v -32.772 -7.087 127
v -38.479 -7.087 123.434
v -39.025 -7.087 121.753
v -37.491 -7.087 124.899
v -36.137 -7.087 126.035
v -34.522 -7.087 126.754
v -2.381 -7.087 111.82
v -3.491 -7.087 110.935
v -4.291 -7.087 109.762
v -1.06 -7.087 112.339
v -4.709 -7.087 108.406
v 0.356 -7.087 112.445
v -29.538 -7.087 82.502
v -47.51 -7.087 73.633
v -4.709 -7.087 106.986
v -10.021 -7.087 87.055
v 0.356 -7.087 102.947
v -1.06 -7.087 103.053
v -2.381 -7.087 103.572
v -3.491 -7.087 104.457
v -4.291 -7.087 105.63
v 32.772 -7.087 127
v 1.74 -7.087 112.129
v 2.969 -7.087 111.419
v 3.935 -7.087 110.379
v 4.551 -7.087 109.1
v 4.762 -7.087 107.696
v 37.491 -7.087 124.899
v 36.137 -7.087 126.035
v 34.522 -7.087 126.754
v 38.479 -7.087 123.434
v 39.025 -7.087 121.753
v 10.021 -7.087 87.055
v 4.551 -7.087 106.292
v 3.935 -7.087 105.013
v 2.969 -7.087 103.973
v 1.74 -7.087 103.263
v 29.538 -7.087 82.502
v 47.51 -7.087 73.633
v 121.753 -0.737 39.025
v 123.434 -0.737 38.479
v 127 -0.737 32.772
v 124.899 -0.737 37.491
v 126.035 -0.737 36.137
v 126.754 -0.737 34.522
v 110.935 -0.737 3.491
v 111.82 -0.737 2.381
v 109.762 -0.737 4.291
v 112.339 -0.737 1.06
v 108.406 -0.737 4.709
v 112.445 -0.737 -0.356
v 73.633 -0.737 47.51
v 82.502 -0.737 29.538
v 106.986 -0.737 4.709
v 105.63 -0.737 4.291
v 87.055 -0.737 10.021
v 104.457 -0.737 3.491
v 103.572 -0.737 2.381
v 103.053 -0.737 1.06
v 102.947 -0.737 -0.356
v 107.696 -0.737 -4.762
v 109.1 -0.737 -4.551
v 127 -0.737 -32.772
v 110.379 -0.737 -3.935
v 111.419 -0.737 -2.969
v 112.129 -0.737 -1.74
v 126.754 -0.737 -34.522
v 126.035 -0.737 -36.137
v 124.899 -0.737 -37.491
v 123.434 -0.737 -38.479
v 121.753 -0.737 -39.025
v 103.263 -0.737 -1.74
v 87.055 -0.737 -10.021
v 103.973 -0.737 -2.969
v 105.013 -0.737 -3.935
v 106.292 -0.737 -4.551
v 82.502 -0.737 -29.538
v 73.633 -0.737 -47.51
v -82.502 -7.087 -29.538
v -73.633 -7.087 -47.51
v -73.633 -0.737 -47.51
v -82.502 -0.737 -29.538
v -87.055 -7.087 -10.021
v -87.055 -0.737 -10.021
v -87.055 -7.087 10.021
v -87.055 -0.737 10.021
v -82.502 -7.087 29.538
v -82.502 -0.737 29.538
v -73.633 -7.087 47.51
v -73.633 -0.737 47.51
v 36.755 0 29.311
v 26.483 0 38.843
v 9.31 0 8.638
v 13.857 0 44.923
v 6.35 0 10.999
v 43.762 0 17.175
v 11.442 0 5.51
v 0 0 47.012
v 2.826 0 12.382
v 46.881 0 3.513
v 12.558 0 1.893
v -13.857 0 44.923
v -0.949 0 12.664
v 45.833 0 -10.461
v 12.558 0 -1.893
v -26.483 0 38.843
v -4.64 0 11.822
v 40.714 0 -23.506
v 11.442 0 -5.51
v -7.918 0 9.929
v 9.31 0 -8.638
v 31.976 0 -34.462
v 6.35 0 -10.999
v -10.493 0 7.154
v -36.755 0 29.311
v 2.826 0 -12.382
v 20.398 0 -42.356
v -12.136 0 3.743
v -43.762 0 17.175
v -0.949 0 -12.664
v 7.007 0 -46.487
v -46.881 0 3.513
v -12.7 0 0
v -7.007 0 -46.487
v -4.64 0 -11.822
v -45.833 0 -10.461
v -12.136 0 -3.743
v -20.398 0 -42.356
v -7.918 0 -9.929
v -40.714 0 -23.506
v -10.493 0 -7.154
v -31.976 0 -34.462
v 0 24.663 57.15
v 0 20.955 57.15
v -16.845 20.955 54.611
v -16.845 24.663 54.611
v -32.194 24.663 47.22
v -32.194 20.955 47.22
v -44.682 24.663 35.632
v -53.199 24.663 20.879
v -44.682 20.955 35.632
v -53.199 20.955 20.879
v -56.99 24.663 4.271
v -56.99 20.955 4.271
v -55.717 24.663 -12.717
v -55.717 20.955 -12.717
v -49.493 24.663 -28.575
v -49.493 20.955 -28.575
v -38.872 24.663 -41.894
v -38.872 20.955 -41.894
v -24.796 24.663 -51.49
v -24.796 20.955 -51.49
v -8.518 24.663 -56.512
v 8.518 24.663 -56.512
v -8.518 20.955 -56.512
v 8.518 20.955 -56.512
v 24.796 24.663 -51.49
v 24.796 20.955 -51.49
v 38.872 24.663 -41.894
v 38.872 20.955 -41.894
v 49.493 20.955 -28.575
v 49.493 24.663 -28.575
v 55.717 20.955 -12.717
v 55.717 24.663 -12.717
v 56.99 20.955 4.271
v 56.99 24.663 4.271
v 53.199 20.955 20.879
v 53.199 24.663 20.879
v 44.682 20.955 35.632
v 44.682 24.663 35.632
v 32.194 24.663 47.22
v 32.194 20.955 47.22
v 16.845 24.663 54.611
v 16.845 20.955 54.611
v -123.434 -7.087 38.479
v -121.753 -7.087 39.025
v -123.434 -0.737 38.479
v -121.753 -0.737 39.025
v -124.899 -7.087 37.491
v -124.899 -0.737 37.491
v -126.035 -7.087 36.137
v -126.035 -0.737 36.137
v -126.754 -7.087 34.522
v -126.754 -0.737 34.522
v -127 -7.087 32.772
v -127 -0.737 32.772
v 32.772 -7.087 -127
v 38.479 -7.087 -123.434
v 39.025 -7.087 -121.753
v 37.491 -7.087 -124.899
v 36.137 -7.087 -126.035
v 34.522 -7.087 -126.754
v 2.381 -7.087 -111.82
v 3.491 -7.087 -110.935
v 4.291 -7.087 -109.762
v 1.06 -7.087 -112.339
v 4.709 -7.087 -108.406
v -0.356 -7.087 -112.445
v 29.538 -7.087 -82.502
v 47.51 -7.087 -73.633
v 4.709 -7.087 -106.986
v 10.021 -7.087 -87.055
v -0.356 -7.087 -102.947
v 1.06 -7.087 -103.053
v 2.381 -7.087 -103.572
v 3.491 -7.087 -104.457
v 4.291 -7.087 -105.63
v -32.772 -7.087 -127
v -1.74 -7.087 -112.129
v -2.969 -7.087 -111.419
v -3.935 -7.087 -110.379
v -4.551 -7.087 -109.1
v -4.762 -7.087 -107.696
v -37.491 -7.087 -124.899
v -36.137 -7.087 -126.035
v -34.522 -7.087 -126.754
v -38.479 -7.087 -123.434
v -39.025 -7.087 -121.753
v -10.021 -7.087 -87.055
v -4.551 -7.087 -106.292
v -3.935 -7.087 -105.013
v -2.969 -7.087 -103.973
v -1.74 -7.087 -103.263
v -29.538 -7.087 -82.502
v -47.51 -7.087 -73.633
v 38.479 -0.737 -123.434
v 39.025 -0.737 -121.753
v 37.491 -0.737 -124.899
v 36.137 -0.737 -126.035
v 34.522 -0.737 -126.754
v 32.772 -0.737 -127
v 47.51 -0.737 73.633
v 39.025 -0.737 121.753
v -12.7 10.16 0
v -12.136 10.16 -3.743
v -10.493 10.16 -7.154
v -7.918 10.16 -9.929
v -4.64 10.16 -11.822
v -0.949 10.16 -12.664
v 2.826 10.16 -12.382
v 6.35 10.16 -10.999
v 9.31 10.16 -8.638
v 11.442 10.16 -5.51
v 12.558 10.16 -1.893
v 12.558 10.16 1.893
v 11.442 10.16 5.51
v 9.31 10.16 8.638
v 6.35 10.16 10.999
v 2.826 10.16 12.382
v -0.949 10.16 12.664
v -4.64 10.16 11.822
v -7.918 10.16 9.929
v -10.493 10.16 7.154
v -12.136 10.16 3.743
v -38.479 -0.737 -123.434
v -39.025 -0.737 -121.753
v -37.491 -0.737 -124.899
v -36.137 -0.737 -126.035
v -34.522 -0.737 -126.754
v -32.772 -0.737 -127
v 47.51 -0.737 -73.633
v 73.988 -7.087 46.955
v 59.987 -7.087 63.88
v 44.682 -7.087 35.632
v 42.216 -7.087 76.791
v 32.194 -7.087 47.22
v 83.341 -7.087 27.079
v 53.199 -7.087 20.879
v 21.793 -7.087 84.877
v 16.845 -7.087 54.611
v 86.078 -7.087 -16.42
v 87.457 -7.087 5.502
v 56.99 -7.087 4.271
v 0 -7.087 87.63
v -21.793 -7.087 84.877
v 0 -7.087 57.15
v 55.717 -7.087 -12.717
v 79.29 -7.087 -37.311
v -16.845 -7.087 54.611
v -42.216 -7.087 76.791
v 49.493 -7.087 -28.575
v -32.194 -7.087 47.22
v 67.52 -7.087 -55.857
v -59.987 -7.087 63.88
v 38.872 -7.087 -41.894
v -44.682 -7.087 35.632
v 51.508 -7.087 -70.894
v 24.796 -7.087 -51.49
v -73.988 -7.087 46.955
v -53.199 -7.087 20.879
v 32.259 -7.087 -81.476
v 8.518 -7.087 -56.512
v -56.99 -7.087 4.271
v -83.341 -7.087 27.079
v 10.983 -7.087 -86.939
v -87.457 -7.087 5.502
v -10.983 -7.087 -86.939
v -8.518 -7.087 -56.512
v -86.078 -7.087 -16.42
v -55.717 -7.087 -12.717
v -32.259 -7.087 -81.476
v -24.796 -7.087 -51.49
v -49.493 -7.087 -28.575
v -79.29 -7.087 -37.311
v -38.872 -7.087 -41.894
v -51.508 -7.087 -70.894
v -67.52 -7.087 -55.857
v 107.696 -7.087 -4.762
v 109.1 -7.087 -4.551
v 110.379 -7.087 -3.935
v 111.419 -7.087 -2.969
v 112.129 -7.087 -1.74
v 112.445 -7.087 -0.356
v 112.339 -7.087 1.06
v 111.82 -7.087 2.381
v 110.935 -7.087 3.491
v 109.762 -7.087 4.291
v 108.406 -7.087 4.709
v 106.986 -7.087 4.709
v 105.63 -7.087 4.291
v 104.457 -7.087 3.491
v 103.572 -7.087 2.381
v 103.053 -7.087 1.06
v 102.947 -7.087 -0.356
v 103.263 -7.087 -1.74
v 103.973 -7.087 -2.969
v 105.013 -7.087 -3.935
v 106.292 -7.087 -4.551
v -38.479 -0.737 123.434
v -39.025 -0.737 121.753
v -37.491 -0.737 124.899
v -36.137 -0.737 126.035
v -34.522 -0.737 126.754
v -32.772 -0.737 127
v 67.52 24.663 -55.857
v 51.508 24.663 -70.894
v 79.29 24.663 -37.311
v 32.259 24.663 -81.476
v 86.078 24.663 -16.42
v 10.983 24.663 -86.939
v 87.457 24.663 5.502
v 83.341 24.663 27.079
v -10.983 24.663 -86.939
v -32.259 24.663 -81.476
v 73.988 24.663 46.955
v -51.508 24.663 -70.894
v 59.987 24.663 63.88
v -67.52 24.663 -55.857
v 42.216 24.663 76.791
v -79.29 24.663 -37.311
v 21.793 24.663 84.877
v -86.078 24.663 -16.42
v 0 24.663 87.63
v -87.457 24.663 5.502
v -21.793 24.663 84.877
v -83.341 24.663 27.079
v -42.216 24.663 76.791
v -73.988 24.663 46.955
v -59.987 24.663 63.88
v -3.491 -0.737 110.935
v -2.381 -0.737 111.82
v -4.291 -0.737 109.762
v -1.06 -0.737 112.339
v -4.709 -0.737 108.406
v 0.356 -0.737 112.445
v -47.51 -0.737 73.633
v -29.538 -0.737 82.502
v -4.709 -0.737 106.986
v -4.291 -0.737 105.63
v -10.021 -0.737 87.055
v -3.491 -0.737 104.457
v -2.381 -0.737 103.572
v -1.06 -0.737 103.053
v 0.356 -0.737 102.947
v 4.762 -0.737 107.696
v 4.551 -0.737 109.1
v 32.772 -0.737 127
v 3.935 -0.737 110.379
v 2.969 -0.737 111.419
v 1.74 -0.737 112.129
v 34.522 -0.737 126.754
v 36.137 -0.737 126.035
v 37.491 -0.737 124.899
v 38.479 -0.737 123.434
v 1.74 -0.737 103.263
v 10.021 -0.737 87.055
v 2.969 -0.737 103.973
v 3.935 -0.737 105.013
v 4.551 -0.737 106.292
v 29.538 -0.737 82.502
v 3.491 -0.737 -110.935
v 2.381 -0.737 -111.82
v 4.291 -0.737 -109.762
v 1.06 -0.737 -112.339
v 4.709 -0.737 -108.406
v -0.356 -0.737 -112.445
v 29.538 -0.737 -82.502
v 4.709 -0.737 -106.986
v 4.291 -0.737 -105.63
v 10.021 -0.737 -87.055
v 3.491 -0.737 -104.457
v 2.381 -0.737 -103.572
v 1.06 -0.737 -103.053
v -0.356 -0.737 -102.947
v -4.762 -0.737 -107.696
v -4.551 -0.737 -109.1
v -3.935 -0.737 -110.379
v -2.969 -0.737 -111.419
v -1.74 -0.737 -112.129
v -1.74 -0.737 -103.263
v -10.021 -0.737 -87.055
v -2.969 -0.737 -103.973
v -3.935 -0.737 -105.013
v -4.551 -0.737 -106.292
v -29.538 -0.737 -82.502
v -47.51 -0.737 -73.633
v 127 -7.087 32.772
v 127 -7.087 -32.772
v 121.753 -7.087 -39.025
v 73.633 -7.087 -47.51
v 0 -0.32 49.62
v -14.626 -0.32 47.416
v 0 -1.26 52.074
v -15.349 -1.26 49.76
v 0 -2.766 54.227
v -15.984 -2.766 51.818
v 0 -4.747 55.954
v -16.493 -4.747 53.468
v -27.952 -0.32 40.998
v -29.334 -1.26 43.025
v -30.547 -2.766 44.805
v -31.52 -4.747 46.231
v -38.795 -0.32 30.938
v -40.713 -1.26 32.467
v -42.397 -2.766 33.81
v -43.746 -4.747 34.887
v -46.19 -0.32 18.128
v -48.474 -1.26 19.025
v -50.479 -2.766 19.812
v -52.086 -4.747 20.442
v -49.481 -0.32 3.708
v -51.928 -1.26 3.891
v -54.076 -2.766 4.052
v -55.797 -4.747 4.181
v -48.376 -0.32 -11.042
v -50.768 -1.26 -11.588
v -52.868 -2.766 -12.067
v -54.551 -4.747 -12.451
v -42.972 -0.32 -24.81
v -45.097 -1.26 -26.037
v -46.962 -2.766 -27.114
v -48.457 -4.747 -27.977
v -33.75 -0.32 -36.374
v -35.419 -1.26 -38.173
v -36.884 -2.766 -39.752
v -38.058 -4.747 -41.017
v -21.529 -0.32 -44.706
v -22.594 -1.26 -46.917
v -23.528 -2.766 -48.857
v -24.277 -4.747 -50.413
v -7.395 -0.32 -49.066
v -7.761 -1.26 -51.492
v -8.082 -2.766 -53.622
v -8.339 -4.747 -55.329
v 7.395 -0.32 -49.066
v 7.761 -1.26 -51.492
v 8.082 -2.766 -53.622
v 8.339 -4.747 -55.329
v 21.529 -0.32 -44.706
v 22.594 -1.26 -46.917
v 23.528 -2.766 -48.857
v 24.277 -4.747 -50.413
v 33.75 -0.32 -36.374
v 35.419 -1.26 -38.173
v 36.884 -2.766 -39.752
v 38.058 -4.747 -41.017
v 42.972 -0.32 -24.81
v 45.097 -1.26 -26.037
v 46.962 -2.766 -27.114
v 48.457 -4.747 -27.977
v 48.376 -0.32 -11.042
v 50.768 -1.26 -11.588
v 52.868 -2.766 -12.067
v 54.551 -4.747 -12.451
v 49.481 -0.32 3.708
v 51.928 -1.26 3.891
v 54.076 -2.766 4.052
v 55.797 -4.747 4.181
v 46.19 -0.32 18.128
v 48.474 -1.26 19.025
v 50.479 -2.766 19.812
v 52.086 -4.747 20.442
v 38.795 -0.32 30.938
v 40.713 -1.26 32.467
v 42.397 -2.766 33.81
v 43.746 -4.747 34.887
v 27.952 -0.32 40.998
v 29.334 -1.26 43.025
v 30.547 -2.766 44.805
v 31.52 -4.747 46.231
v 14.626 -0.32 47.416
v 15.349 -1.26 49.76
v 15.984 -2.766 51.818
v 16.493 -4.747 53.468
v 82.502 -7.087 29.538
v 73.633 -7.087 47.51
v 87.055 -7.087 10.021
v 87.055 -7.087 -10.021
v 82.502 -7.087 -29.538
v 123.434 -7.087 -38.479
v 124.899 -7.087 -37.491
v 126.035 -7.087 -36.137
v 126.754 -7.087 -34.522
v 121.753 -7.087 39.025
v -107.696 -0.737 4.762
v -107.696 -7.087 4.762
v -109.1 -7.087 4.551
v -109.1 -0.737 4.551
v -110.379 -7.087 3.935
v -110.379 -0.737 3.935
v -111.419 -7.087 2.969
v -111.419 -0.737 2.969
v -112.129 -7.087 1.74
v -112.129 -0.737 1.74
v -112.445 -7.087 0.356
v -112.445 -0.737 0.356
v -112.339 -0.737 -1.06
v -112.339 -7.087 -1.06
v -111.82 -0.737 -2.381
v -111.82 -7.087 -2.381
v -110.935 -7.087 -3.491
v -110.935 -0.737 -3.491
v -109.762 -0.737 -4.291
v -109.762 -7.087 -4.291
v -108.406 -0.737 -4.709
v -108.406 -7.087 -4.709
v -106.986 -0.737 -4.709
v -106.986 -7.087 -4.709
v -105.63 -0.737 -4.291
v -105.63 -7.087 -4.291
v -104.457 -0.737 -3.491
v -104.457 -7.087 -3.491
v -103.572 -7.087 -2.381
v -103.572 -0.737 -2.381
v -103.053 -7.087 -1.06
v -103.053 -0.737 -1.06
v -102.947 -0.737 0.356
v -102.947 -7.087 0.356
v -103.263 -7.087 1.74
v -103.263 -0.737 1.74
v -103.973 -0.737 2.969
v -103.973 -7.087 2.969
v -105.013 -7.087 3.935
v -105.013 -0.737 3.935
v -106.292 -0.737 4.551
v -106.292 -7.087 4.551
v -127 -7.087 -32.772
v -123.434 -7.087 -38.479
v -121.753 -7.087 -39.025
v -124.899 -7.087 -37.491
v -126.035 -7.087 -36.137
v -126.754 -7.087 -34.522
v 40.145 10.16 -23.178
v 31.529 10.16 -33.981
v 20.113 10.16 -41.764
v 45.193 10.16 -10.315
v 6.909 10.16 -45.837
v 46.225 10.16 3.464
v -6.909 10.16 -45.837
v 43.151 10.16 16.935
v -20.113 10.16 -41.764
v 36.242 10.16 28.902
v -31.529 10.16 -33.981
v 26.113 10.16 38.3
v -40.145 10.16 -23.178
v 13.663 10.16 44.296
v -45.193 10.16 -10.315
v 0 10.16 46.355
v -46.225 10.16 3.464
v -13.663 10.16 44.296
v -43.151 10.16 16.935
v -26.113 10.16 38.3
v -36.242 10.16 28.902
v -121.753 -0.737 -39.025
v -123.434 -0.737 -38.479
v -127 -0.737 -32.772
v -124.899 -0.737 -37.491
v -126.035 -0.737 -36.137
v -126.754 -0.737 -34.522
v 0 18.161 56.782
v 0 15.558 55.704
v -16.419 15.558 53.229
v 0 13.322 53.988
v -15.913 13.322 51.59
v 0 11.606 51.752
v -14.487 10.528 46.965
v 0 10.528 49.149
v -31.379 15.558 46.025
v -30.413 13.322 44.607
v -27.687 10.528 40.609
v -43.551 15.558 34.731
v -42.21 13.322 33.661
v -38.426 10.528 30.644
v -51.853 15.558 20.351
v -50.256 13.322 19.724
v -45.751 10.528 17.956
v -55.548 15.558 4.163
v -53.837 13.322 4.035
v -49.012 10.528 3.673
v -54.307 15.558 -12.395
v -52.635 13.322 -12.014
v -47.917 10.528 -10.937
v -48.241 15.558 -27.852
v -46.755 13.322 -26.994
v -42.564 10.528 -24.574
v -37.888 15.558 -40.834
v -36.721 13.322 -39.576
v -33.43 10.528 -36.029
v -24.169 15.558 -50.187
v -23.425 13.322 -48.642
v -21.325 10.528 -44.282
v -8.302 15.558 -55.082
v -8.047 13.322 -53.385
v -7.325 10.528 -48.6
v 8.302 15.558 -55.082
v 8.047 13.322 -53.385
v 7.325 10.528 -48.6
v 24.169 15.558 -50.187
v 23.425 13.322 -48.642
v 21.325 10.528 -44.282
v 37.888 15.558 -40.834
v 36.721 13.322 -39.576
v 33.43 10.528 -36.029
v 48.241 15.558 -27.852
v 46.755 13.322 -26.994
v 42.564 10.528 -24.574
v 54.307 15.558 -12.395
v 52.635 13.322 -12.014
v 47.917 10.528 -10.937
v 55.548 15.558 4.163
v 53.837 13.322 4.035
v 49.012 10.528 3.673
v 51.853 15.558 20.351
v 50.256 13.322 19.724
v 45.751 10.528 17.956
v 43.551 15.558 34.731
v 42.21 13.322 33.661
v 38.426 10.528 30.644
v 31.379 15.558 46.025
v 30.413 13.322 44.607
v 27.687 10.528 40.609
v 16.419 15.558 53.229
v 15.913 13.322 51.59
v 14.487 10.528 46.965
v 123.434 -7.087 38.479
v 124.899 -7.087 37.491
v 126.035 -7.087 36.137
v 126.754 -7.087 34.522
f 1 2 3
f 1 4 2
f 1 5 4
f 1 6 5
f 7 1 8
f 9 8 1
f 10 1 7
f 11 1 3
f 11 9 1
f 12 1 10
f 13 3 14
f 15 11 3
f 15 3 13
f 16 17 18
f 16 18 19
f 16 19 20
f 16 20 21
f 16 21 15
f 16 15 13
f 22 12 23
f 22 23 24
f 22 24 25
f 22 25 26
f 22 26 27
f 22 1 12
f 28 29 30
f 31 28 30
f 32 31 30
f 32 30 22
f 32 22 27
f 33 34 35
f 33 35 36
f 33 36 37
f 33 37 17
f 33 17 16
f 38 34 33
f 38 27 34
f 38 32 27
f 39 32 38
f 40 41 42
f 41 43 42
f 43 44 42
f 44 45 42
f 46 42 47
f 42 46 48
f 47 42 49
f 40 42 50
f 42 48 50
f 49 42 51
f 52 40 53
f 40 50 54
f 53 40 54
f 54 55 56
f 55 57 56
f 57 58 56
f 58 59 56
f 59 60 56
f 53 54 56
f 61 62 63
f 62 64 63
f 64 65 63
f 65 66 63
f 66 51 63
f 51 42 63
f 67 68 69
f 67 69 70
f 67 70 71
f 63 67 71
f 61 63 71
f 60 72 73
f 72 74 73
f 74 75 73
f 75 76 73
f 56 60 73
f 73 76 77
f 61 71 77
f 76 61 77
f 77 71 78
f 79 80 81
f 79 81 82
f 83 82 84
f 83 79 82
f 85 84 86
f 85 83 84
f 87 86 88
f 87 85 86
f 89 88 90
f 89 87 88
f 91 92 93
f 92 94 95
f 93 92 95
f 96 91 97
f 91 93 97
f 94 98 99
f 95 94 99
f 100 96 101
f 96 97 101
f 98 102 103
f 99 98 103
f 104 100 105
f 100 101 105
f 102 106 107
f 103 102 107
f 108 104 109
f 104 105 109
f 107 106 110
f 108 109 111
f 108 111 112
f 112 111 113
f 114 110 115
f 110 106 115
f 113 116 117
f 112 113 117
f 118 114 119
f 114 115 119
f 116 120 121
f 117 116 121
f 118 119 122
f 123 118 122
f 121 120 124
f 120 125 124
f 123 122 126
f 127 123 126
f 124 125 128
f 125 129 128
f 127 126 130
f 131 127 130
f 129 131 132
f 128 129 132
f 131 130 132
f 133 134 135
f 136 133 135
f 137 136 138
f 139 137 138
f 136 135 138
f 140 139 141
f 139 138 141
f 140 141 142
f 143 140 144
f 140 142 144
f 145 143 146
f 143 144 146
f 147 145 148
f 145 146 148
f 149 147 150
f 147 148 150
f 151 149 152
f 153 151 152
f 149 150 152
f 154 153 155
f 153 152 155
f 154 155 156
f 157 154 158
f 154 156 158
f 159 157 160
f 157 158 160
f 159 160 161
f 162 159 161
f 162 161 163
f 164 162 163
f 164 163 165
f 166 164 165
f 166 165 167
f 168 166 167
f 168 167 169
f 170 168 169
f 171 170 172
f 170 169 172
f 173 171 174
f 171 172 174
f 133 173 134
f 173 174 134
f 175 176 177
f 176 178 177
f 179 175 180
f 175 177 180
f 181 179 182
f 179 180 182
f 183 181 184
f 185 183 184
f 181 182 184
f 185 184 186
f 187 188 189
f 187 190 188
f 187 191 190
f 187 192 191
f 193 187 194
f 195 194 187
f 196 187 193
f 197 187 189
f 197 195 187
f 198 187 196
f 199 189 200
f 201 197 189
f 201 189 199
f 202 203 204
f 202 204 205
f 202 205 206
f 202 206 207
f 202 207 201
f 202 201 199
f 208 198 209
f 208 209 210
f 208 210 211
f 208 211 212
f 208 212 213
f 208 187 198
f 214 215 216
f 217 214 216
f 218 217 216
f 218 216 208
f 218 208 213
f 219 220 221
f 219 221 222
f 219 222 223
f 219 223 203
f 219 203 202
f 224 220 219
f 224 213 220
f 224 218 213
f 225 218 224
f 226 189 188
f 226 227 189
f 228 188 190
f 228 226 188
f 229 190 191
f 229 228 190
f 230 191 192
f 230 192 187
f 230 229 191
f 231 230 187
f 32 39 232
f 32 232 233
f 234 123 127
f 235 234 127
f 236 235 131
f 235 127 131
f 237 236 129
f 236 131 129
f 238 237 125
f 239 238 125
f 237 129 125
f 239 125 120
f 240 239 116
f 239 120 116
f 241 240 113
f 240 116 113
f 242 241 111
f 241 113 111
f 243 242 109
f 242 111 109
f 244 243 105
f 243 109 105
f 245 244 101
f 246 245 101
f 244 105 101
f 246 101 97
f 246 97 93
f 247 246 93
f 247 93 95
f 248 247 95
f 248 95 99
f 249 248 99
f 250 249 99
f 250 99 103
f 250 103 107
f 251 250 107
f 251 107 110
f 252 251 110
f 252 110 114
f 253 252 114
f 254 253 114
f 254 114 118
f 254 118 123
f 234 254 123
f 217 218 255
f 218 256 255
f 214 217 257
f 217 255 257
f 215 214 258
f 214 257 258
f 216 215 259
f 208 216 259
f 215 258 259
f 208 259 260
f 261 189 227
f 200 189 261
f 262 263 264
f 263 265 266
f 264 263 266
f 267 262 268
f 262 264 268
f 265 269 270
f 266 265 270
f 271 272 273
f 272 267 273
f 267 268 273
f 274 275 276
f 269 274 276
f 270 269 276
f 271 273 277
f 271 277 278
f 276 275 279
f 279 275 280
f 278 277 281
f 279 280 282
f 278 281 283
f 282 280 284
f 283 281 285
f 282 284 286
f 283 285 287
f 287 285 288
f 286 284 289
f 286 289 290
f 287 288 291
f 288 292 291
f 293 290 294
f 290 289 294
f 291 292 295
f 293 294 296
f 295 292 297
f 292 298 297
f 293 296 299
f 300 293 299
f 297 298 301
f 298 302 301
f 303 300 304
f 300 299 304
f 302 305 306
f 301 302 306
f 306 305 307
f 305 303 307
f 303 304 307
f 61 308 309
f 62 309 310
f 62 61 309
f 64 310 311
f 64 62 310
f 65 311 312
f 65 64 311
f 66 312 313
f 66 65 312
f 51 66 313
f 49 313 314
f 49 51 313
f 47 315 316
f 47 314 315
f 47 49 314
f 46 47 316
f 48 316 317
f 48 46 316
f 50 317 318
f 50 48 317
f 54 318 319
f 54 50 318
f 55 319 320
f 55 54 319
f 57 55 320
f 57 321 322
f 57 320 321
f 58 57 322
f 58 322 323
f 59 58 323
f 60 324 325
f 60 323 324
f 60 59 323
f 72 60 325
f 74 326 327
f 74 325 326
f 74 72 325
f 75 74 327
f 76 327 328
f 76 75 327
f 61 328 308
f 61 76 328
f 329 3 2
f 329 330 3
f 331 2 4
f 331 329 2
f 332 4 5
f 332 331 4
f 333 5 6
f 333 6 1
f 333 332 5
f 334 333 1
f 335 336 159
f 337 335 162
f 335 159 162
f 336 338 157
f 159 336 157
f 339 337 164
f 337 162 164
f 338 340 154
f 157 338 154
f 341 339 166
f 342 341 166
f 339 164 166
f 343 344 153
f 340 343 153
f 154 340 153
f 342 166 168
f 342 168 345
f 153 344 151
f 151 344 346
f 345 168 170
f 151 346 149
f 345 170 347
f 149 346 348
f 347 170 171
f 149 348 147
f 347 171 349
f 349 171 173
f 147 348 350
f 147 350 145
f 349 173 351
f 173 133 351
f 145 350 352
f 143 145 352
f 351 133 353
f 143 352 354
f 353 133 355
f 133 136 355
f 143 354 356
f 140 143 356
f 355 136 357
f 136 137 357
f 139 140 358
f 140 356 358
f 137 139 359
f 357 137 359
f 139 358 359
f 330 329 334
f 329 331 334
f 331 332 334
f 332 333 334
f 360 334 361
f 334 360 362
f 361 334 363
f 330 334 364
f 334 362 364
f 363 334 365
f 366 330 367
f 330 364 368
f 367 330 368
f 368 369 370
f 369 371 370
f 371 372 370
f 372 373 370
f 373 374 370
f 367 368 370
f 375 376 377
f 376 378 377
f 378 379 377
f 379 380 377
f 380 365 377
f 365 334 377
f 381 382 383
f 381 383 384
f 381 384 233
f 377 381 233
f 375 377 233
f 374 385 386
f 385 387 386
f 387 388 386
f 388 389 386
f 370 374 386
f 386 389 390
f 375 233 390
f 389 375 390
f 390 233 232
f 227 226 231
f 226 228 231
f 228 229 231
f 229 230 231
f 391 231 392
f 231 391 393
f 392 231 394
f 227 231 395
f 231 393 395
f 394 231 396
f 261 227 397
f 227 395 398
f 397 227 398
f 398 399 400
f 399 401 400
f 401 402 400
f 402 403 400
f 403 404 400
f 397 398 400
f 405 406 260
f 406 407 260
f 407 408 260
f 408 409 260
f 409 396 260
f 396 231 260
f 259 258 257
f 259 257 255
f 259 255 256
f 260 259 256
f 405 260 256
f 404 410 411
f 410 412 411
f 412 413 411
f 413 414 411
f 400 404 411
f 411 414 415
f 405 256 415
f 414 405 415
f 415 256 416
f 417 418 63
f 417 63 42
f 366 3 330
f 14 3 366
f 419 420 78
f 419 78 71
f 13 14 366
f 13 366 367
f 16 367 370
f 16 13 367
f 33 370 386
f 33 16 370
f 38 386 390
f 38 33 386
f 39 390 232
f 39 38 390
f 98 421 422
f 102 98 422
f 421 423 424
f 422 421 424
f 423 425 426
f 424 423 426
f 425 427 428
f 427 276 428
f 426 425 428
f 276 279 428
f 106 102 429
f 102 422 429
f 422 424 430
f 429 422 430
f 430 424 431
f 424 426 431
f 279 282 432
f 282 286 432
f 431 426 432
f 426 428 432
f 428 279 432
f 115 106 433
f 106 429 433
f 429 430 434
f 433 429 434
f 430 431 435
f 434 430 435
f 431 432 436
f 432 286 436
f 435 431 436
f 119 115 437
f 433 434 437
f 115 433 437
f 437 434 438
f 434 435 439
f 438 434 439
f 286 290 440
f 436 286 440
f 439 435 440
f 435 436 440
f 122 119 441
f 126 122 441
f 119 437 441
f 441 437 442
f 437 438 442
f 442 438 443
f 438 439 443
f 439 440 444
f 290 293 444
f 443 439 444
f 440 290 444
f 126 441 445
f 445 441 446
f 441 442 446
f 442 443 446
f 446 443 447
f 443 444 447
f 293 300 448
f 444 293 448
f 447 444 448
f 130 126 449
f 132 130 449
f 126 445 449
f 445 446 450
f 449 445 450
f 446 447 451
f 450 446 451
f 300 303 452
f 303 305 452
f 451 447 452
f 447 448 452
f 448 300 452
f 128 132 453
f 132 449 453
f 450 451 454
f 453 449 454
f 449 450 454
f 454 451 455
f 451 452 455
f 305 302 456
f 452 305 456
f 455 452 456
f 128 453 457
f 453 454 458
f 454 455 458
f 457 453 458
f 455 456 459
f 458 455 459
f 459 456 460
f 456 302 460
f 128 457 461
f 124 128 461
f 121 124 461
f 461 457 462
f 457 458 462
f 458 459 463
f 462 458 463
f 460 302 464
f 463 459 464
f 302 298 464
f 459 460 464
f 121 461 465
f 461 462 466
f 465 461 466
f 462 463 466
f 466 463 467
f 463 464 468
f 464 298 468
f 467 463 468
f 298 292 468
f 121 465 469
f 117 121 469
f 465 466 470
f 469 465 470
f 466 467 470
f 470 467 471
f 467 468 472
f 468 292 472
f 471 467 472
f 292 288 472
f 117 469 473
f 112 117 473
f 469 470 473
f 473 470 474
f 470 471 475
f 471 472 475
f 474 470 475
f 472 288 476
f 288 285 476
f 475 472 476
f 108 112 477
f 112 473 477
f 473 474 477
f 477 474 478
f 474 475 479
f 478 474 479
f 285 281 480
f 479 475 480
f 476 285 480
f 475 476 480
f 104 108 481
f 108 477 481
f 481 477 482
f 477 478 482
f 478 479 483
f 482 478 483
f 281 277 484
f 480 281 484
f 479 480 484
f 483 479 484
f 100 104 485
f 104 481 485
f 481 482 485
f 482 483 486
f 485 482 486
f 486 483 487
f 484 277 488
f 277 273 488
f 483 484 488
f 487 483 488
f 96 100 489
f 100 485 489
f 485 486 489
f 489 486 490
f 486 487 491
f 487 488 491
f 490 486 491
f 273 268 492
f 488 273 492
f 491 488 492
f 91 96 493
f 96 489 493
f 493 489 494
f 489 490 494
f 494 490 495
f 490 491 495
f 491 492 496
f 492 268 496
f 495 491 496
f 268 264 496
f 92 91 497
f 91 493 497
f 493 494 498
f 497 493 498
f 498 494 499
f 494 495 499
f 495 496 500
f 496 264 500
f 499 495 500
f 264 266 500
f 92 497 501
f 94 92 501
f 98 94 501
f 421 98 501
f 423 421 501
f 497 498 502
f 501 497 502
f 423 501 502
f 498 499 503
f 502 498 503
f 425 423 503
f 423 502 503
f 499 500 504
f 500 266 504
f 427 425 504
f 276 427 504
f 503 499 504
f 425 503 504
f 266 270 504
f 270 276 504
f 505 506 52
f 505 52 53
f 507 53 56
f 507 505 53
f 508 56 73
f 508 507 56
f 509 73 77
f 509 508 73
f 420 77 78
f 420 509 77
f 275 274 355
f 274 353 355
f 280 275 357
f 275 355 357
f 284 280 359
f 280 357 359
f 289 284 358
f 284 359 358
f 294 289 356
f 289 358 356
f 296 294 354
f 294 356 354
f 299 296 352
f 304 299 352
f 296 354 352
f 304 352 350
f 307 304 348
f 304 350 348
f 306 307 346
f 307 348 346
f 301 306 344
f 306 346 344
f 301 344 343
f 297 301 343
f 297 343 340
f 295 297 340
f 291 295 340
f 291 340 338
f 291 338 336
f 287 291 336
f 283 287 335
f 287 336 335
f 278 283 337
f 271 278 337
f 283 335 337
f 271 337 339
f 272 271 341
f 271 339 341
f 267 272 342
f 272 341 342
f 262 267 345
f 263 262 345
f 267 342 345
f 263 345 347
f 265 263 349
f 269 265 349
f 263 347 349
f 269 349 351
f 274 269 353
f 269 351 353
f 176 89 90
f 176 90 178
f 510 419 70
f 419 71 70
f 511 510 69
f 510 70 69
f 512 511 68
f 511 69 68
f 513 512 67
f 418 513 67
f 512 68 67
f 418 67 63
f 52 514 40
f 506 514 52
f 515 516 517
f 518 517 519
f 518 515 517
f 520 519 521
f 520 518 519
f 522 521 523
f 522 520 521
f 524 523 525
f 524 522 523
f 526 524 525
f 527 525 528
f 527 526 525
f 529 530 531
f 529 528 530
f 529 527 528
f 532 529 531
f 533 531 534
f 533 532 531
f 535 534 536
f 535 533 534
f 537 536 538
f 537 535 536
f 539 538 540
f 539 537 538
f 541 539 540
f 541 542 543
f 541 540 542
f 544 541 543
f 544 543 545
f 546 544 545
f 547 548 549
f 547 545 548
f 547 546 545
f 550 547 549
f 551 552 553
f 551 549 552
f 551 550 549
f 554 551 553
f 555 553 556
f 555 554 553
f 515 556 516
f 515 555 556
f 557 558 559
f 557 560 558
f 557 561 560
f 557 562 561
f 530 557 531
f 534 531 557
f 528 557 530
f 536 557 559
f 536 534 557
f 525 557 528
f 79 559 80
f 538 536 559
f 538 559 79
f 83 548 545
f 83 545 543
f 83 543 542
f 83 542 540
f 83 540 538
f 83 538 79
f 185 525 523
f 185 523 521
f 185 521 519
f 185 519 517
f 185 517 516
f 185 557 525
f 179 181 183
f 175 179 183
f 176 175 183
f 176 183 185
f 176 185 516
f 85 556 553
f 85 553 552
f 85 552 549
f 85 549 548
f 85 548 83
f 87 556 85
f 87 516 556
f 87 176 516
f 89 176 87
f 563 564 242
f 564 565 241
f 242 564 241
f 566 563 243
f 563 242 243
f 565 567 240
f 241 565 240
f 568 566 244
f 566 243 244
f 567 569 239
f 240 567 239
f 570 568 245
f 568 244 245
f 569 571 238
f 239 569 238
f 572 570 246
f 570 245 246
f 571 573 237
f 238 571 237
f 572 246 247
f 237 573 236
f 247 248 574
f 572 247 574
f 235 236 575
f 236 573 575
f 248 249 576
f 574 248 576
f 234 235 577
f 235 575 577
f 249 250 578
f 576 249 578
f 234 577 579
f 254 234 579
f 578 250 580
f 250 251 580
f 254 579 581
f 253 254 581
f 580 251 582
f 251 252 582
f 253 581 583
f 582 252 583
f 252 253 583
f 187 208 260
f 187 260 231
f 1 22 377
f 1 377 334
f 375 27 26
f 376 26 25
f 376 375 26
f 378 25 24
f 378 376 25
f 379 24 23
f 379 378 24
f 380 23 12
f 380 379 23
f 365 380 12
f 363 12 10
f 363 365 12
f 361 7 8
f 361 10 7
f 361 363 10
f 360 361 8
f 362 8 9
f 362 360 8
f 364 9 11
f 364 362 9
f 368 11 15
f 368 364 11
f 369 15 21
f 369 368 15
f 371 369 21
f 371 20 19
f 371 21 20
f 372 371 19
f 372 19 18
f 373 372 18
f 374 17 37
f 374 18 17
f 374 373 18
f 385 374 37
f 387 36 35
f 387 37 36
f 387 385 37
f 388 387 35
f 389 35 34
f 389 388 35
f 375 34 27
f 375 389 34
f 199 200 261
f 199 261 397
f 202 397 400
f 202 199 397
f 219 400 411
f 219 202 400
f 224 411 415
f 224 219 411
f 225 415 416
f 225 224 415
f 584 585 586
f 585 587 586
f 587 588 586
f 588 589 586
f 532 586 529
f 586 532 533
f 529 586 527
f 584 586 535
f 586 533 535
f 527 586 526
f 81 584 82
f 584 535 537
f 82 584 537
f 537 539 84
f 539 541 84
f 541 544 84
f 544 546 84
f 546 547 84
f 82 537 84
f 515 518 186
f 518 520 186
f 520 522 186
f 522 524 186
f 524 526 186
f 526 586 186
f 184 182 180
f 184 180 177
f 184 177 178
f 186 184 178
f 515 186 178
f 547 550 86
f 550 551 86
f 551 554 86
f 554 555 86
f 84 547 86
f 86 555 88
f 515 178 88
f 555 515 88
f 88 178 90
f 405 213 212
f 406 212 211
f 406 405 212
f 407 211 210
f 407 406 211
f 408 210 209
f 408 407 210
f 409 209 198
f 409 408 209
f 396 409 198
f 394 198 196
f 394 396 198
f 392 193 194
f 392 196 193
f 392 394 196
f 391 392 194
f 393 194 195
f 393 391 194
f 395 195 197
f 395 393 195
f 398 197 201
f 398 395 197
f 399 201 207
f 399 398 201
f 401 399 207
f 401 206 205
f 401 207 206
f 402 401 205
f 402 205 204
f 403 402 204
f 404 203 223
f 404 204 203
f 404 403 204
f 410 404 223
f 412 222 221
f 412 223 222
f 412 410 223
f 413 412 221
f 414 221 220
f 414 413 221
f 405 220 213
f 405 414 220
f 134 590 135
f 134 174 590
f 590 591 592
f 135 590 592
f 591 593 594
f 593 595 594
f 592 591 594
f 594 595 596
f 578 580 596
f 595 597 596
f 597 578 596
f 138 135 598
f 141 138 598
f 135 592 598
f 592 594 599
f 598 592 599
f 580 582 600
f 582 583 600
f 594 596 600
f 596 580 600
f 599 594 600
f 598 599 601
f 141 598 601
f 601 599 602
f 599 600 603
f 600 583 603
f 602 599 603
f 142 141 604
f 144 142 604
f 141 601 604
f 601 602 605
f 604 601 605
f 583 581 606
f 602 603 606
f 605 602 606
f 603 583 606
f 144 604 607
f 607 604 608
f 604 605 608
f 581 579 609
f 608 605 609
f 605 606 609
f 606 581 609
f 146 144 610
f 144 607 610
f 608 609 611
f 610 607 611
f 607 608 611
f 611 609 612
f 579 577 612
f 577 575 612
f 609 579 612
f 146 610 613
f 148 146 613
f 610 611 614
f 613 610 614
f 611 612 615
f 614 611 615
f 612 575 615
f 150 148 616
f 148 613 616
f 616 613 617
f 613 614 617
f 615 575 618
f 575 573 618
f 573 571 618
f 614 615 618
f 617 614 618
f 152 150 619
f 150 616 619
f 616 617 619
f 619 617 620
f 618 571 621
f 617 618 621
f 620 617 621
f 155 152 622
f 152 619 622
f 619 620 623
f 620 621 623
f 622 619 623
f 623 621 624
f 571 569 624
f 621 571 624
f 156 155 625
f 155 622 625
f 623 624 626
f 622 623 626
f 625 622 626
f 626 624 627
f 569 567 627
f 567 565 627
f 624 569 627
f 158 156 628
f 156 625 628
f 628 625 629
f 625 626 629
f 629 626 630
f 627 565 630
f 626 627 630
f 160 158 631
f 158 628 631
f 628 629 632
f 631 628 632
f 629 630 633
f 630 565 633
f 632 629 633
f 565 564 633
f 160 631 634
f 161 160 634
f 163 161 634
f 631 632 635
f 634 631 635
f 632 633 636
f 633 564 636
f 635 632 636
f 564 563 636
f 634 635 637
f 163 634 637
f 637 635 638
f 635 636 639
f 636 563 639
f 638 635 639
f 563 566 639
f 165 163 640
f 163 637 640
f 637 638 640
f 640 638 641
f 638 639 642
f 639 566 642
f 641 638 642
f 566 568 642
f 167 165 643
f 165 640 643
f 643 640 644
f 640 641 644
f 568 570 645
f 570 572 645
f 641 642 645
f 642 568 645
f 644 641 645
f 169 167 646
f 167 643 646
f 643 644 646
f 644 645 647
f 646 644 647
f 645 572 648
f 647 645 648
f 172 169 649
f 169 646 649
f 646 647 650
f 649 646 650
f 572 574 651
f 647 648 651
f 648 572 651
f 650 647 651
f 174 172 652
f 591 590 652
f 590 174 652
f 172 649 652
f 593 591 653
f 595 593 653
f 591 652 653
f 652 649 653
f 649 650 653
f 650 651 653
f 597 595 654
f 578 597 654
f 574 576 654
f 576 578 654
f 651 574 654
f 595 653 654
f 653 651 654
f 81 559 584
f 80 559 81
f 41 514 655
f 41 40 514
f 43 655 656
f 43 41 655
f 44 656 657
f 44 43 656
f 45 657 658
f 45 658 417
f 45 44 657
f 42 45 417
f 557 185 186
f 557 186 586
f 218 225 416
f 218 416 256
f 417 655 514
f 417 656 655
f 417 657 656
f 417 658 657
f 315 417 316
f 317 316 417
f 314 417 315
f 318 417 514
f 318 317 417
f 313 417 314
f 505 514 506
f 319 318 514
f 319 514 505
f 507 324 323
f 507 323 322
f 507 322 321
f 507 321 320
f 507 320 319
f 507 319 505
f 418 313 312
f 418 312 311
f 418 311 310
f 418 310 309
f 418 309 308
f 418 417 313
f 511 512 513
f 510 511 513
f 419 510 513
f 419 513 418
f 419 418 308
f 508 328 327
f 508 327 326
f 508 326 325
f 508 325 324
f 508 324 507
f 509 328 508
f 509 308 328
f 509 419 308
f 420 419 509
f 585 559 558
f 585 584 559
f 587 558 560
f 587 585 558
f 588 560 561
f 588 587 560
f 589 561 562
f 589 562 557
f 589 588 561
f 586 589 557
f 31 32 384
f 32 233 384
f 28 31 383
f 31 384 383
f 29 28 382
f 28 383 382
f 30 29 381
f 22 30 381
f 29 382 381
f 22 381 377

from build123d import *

# Parameters (mm, degrees)
F_1_1_DIAMETER_HOLE1_D = 25.4
BOSS_EXTRUDE1_DEPTH    = 6.35
FILLET2_R              = 6.35
CIRPATTERN4_COUNT      = 4
FILLET3_R              = 10.795


with BuildPart() as part:
    # Sketch1 → Revolve1 (revolve)
    with BuildSketch(Plane.XY, mode=Mode.PRIVATE) as revolve1_sk:
        Polygon((87.63, -7.0866), (87.63, 24.6634), (57.15, 24.6634), (57.15, 10.16), (0, 10.16), (0, 0), (57.15, 0), (57.15, -7.0866), align=None)
    revolve(revolve1_sk.sketch.rotate(Axis((0, 92.596818824, 0), (0, -1, 0)), 90), axis=Axis((0, 92.596818824, 0), (0, -1, 0)))

    # 1 (1) Diameter Hole1 (through all)
    with Locations(Plane(origin=(0, 10.16, 0), x_dir=(1, 0, 0), z_dir=(0, 1, 0))):
        with Locations((0, 0)):
            Hole(F_1_1_DIAMETER_HOLE1_D / 2)

    # Fillet3
    # the kernel refuses this fillet: 10.795 mm, written as the material it adds along each edge
    with BuildSketch(Plane(origin=(0, 0, 0), x_dir=(0, 0, 1), z_dir=(1, 0, 0))) as fillet3_piece_1:
        with BuildLine():
            CenterArc((47.011962989, 10.795), FILLET3_R, 270, 69.907948581)
            Line((47.011962989, 0), (47.011962989, -0.2159))
            Line((47.011962989, -0.2159), (57.15, -0.2159))
            Line((57.15, -0.2159), (57.3659, 0))
            ThreePointArc((57.3659, 0), (57.3659, 3.5433), (57.35276074, 7.012432))
            Line((57.35276074, 7.012432), (57.15, 7.0866))
        make_face()
    revolve(axis=Axis((0, 0, 0), (0, -1, 0)))
    with BuildSketch(Plane(origin=(0, 10.16, 0), x_dir=(0, 0, 1), z_dir=(1, 0, 0))) as fillet3_piece_2:
        with BuildLine():
            CenterArc((57.15 - FILLET3_R, -FILLET3_R), FILLET3_R, 0, 90)
            Line((57.15 - FILLET3_R, 0), (57.15 - FILLET3_R, FILLET3_R * 0.02))
            Line((57.15 - FILLET3_R, FILLET3_R * 0.02), (57.15 + FILLET3_R * 0.02, FILLET3_R * 0.02))
            Line((57.15 + FILLET3_R * 0.02, FILLET3_R * 0.02), (57.15 + FILLET3_R * 0.02, -FILLET3_R))
            Line((57.15 + FILLET3_R * 0.02, -FILLET3_R), (57.15, -FILLET3_R))
        make_face()
    revolve(axis=Axis((0, 10.16, 0), (0, -1, 0)))


with BuildPart() as body_2:
    # Sketch15 → Boss-Extrude1 (new body)
    with BuildSketch(Plane.XZ.offset(7.0866)):
        with BuildLine():
            Line((-127, -38.1), (-73.632954963, -47.510049921))
            ThreePointArc((-73.632954963, -47.510049921), (-87.63, 0), (-73.632954963, 47.510049921))
            Line((-73.632954963, 47.510049921), (-127, 38.1))
            Line((-127, 38.1), (-127, -38.1))
        make_face()
    extrude(amount=-BOSS_EXTRUDE1_DEPTH)

    # Fillet2
    fillet2_edges = [body_2.edges().sort_by_distance(p)[0] for p in [
        (-127, -3.9116, 38.1),
        (-127, -3.9116, -38.1),
    ]]
    fillet(fillet2_edges, radius=FILLET2_R)

    # Sketch17 → 3/8 (0.375) Diameter Hole1 (revolve, cut)
    with BuildSketch(Plane(origin=(-107.696, -0.7366, 0), x_dir=(0, 0, 1), z_dir=(1, 0, 0))):
        Polygon((0, 0), (0, 28.261598698), (4.7625, 25.4), (4.7625, 0), align=None)
    revolve(axis=Axis((-107.696, 5.6134, 0), (0, -1, 0)), mode=Mode.SUBTRACT)


with BuildPart() as cirpattern4_1:
    # CirPattern4: pattern copy
    add(body_2.part.rotate(Axis((0, 0, 0), (0, 1, 0)), 1 * 360 / CIRPATTERN4_COUNT))


with BuildPart() as cirpattern4_2:
    # CirPattern4: pattern copy
    add(body_2.part.rotate(Axis((0, 0, 0), (0, 1, 0)), 2 * 360 / CIRPATTERN4_COUNT))


with BuildPart() as cirpattern4_3:
    # CirPattern4: pattern copy
    add(body_2.part.rotate(Axis((0, 0, 0), (0, 1, 0)), 3 * 360 / CIRPATTERN4_COUNT))


solid = Compound([part.part, body_2.part, cirpattern4_1.part, cirpattern4_2.part, cirpattern4_3.part])
